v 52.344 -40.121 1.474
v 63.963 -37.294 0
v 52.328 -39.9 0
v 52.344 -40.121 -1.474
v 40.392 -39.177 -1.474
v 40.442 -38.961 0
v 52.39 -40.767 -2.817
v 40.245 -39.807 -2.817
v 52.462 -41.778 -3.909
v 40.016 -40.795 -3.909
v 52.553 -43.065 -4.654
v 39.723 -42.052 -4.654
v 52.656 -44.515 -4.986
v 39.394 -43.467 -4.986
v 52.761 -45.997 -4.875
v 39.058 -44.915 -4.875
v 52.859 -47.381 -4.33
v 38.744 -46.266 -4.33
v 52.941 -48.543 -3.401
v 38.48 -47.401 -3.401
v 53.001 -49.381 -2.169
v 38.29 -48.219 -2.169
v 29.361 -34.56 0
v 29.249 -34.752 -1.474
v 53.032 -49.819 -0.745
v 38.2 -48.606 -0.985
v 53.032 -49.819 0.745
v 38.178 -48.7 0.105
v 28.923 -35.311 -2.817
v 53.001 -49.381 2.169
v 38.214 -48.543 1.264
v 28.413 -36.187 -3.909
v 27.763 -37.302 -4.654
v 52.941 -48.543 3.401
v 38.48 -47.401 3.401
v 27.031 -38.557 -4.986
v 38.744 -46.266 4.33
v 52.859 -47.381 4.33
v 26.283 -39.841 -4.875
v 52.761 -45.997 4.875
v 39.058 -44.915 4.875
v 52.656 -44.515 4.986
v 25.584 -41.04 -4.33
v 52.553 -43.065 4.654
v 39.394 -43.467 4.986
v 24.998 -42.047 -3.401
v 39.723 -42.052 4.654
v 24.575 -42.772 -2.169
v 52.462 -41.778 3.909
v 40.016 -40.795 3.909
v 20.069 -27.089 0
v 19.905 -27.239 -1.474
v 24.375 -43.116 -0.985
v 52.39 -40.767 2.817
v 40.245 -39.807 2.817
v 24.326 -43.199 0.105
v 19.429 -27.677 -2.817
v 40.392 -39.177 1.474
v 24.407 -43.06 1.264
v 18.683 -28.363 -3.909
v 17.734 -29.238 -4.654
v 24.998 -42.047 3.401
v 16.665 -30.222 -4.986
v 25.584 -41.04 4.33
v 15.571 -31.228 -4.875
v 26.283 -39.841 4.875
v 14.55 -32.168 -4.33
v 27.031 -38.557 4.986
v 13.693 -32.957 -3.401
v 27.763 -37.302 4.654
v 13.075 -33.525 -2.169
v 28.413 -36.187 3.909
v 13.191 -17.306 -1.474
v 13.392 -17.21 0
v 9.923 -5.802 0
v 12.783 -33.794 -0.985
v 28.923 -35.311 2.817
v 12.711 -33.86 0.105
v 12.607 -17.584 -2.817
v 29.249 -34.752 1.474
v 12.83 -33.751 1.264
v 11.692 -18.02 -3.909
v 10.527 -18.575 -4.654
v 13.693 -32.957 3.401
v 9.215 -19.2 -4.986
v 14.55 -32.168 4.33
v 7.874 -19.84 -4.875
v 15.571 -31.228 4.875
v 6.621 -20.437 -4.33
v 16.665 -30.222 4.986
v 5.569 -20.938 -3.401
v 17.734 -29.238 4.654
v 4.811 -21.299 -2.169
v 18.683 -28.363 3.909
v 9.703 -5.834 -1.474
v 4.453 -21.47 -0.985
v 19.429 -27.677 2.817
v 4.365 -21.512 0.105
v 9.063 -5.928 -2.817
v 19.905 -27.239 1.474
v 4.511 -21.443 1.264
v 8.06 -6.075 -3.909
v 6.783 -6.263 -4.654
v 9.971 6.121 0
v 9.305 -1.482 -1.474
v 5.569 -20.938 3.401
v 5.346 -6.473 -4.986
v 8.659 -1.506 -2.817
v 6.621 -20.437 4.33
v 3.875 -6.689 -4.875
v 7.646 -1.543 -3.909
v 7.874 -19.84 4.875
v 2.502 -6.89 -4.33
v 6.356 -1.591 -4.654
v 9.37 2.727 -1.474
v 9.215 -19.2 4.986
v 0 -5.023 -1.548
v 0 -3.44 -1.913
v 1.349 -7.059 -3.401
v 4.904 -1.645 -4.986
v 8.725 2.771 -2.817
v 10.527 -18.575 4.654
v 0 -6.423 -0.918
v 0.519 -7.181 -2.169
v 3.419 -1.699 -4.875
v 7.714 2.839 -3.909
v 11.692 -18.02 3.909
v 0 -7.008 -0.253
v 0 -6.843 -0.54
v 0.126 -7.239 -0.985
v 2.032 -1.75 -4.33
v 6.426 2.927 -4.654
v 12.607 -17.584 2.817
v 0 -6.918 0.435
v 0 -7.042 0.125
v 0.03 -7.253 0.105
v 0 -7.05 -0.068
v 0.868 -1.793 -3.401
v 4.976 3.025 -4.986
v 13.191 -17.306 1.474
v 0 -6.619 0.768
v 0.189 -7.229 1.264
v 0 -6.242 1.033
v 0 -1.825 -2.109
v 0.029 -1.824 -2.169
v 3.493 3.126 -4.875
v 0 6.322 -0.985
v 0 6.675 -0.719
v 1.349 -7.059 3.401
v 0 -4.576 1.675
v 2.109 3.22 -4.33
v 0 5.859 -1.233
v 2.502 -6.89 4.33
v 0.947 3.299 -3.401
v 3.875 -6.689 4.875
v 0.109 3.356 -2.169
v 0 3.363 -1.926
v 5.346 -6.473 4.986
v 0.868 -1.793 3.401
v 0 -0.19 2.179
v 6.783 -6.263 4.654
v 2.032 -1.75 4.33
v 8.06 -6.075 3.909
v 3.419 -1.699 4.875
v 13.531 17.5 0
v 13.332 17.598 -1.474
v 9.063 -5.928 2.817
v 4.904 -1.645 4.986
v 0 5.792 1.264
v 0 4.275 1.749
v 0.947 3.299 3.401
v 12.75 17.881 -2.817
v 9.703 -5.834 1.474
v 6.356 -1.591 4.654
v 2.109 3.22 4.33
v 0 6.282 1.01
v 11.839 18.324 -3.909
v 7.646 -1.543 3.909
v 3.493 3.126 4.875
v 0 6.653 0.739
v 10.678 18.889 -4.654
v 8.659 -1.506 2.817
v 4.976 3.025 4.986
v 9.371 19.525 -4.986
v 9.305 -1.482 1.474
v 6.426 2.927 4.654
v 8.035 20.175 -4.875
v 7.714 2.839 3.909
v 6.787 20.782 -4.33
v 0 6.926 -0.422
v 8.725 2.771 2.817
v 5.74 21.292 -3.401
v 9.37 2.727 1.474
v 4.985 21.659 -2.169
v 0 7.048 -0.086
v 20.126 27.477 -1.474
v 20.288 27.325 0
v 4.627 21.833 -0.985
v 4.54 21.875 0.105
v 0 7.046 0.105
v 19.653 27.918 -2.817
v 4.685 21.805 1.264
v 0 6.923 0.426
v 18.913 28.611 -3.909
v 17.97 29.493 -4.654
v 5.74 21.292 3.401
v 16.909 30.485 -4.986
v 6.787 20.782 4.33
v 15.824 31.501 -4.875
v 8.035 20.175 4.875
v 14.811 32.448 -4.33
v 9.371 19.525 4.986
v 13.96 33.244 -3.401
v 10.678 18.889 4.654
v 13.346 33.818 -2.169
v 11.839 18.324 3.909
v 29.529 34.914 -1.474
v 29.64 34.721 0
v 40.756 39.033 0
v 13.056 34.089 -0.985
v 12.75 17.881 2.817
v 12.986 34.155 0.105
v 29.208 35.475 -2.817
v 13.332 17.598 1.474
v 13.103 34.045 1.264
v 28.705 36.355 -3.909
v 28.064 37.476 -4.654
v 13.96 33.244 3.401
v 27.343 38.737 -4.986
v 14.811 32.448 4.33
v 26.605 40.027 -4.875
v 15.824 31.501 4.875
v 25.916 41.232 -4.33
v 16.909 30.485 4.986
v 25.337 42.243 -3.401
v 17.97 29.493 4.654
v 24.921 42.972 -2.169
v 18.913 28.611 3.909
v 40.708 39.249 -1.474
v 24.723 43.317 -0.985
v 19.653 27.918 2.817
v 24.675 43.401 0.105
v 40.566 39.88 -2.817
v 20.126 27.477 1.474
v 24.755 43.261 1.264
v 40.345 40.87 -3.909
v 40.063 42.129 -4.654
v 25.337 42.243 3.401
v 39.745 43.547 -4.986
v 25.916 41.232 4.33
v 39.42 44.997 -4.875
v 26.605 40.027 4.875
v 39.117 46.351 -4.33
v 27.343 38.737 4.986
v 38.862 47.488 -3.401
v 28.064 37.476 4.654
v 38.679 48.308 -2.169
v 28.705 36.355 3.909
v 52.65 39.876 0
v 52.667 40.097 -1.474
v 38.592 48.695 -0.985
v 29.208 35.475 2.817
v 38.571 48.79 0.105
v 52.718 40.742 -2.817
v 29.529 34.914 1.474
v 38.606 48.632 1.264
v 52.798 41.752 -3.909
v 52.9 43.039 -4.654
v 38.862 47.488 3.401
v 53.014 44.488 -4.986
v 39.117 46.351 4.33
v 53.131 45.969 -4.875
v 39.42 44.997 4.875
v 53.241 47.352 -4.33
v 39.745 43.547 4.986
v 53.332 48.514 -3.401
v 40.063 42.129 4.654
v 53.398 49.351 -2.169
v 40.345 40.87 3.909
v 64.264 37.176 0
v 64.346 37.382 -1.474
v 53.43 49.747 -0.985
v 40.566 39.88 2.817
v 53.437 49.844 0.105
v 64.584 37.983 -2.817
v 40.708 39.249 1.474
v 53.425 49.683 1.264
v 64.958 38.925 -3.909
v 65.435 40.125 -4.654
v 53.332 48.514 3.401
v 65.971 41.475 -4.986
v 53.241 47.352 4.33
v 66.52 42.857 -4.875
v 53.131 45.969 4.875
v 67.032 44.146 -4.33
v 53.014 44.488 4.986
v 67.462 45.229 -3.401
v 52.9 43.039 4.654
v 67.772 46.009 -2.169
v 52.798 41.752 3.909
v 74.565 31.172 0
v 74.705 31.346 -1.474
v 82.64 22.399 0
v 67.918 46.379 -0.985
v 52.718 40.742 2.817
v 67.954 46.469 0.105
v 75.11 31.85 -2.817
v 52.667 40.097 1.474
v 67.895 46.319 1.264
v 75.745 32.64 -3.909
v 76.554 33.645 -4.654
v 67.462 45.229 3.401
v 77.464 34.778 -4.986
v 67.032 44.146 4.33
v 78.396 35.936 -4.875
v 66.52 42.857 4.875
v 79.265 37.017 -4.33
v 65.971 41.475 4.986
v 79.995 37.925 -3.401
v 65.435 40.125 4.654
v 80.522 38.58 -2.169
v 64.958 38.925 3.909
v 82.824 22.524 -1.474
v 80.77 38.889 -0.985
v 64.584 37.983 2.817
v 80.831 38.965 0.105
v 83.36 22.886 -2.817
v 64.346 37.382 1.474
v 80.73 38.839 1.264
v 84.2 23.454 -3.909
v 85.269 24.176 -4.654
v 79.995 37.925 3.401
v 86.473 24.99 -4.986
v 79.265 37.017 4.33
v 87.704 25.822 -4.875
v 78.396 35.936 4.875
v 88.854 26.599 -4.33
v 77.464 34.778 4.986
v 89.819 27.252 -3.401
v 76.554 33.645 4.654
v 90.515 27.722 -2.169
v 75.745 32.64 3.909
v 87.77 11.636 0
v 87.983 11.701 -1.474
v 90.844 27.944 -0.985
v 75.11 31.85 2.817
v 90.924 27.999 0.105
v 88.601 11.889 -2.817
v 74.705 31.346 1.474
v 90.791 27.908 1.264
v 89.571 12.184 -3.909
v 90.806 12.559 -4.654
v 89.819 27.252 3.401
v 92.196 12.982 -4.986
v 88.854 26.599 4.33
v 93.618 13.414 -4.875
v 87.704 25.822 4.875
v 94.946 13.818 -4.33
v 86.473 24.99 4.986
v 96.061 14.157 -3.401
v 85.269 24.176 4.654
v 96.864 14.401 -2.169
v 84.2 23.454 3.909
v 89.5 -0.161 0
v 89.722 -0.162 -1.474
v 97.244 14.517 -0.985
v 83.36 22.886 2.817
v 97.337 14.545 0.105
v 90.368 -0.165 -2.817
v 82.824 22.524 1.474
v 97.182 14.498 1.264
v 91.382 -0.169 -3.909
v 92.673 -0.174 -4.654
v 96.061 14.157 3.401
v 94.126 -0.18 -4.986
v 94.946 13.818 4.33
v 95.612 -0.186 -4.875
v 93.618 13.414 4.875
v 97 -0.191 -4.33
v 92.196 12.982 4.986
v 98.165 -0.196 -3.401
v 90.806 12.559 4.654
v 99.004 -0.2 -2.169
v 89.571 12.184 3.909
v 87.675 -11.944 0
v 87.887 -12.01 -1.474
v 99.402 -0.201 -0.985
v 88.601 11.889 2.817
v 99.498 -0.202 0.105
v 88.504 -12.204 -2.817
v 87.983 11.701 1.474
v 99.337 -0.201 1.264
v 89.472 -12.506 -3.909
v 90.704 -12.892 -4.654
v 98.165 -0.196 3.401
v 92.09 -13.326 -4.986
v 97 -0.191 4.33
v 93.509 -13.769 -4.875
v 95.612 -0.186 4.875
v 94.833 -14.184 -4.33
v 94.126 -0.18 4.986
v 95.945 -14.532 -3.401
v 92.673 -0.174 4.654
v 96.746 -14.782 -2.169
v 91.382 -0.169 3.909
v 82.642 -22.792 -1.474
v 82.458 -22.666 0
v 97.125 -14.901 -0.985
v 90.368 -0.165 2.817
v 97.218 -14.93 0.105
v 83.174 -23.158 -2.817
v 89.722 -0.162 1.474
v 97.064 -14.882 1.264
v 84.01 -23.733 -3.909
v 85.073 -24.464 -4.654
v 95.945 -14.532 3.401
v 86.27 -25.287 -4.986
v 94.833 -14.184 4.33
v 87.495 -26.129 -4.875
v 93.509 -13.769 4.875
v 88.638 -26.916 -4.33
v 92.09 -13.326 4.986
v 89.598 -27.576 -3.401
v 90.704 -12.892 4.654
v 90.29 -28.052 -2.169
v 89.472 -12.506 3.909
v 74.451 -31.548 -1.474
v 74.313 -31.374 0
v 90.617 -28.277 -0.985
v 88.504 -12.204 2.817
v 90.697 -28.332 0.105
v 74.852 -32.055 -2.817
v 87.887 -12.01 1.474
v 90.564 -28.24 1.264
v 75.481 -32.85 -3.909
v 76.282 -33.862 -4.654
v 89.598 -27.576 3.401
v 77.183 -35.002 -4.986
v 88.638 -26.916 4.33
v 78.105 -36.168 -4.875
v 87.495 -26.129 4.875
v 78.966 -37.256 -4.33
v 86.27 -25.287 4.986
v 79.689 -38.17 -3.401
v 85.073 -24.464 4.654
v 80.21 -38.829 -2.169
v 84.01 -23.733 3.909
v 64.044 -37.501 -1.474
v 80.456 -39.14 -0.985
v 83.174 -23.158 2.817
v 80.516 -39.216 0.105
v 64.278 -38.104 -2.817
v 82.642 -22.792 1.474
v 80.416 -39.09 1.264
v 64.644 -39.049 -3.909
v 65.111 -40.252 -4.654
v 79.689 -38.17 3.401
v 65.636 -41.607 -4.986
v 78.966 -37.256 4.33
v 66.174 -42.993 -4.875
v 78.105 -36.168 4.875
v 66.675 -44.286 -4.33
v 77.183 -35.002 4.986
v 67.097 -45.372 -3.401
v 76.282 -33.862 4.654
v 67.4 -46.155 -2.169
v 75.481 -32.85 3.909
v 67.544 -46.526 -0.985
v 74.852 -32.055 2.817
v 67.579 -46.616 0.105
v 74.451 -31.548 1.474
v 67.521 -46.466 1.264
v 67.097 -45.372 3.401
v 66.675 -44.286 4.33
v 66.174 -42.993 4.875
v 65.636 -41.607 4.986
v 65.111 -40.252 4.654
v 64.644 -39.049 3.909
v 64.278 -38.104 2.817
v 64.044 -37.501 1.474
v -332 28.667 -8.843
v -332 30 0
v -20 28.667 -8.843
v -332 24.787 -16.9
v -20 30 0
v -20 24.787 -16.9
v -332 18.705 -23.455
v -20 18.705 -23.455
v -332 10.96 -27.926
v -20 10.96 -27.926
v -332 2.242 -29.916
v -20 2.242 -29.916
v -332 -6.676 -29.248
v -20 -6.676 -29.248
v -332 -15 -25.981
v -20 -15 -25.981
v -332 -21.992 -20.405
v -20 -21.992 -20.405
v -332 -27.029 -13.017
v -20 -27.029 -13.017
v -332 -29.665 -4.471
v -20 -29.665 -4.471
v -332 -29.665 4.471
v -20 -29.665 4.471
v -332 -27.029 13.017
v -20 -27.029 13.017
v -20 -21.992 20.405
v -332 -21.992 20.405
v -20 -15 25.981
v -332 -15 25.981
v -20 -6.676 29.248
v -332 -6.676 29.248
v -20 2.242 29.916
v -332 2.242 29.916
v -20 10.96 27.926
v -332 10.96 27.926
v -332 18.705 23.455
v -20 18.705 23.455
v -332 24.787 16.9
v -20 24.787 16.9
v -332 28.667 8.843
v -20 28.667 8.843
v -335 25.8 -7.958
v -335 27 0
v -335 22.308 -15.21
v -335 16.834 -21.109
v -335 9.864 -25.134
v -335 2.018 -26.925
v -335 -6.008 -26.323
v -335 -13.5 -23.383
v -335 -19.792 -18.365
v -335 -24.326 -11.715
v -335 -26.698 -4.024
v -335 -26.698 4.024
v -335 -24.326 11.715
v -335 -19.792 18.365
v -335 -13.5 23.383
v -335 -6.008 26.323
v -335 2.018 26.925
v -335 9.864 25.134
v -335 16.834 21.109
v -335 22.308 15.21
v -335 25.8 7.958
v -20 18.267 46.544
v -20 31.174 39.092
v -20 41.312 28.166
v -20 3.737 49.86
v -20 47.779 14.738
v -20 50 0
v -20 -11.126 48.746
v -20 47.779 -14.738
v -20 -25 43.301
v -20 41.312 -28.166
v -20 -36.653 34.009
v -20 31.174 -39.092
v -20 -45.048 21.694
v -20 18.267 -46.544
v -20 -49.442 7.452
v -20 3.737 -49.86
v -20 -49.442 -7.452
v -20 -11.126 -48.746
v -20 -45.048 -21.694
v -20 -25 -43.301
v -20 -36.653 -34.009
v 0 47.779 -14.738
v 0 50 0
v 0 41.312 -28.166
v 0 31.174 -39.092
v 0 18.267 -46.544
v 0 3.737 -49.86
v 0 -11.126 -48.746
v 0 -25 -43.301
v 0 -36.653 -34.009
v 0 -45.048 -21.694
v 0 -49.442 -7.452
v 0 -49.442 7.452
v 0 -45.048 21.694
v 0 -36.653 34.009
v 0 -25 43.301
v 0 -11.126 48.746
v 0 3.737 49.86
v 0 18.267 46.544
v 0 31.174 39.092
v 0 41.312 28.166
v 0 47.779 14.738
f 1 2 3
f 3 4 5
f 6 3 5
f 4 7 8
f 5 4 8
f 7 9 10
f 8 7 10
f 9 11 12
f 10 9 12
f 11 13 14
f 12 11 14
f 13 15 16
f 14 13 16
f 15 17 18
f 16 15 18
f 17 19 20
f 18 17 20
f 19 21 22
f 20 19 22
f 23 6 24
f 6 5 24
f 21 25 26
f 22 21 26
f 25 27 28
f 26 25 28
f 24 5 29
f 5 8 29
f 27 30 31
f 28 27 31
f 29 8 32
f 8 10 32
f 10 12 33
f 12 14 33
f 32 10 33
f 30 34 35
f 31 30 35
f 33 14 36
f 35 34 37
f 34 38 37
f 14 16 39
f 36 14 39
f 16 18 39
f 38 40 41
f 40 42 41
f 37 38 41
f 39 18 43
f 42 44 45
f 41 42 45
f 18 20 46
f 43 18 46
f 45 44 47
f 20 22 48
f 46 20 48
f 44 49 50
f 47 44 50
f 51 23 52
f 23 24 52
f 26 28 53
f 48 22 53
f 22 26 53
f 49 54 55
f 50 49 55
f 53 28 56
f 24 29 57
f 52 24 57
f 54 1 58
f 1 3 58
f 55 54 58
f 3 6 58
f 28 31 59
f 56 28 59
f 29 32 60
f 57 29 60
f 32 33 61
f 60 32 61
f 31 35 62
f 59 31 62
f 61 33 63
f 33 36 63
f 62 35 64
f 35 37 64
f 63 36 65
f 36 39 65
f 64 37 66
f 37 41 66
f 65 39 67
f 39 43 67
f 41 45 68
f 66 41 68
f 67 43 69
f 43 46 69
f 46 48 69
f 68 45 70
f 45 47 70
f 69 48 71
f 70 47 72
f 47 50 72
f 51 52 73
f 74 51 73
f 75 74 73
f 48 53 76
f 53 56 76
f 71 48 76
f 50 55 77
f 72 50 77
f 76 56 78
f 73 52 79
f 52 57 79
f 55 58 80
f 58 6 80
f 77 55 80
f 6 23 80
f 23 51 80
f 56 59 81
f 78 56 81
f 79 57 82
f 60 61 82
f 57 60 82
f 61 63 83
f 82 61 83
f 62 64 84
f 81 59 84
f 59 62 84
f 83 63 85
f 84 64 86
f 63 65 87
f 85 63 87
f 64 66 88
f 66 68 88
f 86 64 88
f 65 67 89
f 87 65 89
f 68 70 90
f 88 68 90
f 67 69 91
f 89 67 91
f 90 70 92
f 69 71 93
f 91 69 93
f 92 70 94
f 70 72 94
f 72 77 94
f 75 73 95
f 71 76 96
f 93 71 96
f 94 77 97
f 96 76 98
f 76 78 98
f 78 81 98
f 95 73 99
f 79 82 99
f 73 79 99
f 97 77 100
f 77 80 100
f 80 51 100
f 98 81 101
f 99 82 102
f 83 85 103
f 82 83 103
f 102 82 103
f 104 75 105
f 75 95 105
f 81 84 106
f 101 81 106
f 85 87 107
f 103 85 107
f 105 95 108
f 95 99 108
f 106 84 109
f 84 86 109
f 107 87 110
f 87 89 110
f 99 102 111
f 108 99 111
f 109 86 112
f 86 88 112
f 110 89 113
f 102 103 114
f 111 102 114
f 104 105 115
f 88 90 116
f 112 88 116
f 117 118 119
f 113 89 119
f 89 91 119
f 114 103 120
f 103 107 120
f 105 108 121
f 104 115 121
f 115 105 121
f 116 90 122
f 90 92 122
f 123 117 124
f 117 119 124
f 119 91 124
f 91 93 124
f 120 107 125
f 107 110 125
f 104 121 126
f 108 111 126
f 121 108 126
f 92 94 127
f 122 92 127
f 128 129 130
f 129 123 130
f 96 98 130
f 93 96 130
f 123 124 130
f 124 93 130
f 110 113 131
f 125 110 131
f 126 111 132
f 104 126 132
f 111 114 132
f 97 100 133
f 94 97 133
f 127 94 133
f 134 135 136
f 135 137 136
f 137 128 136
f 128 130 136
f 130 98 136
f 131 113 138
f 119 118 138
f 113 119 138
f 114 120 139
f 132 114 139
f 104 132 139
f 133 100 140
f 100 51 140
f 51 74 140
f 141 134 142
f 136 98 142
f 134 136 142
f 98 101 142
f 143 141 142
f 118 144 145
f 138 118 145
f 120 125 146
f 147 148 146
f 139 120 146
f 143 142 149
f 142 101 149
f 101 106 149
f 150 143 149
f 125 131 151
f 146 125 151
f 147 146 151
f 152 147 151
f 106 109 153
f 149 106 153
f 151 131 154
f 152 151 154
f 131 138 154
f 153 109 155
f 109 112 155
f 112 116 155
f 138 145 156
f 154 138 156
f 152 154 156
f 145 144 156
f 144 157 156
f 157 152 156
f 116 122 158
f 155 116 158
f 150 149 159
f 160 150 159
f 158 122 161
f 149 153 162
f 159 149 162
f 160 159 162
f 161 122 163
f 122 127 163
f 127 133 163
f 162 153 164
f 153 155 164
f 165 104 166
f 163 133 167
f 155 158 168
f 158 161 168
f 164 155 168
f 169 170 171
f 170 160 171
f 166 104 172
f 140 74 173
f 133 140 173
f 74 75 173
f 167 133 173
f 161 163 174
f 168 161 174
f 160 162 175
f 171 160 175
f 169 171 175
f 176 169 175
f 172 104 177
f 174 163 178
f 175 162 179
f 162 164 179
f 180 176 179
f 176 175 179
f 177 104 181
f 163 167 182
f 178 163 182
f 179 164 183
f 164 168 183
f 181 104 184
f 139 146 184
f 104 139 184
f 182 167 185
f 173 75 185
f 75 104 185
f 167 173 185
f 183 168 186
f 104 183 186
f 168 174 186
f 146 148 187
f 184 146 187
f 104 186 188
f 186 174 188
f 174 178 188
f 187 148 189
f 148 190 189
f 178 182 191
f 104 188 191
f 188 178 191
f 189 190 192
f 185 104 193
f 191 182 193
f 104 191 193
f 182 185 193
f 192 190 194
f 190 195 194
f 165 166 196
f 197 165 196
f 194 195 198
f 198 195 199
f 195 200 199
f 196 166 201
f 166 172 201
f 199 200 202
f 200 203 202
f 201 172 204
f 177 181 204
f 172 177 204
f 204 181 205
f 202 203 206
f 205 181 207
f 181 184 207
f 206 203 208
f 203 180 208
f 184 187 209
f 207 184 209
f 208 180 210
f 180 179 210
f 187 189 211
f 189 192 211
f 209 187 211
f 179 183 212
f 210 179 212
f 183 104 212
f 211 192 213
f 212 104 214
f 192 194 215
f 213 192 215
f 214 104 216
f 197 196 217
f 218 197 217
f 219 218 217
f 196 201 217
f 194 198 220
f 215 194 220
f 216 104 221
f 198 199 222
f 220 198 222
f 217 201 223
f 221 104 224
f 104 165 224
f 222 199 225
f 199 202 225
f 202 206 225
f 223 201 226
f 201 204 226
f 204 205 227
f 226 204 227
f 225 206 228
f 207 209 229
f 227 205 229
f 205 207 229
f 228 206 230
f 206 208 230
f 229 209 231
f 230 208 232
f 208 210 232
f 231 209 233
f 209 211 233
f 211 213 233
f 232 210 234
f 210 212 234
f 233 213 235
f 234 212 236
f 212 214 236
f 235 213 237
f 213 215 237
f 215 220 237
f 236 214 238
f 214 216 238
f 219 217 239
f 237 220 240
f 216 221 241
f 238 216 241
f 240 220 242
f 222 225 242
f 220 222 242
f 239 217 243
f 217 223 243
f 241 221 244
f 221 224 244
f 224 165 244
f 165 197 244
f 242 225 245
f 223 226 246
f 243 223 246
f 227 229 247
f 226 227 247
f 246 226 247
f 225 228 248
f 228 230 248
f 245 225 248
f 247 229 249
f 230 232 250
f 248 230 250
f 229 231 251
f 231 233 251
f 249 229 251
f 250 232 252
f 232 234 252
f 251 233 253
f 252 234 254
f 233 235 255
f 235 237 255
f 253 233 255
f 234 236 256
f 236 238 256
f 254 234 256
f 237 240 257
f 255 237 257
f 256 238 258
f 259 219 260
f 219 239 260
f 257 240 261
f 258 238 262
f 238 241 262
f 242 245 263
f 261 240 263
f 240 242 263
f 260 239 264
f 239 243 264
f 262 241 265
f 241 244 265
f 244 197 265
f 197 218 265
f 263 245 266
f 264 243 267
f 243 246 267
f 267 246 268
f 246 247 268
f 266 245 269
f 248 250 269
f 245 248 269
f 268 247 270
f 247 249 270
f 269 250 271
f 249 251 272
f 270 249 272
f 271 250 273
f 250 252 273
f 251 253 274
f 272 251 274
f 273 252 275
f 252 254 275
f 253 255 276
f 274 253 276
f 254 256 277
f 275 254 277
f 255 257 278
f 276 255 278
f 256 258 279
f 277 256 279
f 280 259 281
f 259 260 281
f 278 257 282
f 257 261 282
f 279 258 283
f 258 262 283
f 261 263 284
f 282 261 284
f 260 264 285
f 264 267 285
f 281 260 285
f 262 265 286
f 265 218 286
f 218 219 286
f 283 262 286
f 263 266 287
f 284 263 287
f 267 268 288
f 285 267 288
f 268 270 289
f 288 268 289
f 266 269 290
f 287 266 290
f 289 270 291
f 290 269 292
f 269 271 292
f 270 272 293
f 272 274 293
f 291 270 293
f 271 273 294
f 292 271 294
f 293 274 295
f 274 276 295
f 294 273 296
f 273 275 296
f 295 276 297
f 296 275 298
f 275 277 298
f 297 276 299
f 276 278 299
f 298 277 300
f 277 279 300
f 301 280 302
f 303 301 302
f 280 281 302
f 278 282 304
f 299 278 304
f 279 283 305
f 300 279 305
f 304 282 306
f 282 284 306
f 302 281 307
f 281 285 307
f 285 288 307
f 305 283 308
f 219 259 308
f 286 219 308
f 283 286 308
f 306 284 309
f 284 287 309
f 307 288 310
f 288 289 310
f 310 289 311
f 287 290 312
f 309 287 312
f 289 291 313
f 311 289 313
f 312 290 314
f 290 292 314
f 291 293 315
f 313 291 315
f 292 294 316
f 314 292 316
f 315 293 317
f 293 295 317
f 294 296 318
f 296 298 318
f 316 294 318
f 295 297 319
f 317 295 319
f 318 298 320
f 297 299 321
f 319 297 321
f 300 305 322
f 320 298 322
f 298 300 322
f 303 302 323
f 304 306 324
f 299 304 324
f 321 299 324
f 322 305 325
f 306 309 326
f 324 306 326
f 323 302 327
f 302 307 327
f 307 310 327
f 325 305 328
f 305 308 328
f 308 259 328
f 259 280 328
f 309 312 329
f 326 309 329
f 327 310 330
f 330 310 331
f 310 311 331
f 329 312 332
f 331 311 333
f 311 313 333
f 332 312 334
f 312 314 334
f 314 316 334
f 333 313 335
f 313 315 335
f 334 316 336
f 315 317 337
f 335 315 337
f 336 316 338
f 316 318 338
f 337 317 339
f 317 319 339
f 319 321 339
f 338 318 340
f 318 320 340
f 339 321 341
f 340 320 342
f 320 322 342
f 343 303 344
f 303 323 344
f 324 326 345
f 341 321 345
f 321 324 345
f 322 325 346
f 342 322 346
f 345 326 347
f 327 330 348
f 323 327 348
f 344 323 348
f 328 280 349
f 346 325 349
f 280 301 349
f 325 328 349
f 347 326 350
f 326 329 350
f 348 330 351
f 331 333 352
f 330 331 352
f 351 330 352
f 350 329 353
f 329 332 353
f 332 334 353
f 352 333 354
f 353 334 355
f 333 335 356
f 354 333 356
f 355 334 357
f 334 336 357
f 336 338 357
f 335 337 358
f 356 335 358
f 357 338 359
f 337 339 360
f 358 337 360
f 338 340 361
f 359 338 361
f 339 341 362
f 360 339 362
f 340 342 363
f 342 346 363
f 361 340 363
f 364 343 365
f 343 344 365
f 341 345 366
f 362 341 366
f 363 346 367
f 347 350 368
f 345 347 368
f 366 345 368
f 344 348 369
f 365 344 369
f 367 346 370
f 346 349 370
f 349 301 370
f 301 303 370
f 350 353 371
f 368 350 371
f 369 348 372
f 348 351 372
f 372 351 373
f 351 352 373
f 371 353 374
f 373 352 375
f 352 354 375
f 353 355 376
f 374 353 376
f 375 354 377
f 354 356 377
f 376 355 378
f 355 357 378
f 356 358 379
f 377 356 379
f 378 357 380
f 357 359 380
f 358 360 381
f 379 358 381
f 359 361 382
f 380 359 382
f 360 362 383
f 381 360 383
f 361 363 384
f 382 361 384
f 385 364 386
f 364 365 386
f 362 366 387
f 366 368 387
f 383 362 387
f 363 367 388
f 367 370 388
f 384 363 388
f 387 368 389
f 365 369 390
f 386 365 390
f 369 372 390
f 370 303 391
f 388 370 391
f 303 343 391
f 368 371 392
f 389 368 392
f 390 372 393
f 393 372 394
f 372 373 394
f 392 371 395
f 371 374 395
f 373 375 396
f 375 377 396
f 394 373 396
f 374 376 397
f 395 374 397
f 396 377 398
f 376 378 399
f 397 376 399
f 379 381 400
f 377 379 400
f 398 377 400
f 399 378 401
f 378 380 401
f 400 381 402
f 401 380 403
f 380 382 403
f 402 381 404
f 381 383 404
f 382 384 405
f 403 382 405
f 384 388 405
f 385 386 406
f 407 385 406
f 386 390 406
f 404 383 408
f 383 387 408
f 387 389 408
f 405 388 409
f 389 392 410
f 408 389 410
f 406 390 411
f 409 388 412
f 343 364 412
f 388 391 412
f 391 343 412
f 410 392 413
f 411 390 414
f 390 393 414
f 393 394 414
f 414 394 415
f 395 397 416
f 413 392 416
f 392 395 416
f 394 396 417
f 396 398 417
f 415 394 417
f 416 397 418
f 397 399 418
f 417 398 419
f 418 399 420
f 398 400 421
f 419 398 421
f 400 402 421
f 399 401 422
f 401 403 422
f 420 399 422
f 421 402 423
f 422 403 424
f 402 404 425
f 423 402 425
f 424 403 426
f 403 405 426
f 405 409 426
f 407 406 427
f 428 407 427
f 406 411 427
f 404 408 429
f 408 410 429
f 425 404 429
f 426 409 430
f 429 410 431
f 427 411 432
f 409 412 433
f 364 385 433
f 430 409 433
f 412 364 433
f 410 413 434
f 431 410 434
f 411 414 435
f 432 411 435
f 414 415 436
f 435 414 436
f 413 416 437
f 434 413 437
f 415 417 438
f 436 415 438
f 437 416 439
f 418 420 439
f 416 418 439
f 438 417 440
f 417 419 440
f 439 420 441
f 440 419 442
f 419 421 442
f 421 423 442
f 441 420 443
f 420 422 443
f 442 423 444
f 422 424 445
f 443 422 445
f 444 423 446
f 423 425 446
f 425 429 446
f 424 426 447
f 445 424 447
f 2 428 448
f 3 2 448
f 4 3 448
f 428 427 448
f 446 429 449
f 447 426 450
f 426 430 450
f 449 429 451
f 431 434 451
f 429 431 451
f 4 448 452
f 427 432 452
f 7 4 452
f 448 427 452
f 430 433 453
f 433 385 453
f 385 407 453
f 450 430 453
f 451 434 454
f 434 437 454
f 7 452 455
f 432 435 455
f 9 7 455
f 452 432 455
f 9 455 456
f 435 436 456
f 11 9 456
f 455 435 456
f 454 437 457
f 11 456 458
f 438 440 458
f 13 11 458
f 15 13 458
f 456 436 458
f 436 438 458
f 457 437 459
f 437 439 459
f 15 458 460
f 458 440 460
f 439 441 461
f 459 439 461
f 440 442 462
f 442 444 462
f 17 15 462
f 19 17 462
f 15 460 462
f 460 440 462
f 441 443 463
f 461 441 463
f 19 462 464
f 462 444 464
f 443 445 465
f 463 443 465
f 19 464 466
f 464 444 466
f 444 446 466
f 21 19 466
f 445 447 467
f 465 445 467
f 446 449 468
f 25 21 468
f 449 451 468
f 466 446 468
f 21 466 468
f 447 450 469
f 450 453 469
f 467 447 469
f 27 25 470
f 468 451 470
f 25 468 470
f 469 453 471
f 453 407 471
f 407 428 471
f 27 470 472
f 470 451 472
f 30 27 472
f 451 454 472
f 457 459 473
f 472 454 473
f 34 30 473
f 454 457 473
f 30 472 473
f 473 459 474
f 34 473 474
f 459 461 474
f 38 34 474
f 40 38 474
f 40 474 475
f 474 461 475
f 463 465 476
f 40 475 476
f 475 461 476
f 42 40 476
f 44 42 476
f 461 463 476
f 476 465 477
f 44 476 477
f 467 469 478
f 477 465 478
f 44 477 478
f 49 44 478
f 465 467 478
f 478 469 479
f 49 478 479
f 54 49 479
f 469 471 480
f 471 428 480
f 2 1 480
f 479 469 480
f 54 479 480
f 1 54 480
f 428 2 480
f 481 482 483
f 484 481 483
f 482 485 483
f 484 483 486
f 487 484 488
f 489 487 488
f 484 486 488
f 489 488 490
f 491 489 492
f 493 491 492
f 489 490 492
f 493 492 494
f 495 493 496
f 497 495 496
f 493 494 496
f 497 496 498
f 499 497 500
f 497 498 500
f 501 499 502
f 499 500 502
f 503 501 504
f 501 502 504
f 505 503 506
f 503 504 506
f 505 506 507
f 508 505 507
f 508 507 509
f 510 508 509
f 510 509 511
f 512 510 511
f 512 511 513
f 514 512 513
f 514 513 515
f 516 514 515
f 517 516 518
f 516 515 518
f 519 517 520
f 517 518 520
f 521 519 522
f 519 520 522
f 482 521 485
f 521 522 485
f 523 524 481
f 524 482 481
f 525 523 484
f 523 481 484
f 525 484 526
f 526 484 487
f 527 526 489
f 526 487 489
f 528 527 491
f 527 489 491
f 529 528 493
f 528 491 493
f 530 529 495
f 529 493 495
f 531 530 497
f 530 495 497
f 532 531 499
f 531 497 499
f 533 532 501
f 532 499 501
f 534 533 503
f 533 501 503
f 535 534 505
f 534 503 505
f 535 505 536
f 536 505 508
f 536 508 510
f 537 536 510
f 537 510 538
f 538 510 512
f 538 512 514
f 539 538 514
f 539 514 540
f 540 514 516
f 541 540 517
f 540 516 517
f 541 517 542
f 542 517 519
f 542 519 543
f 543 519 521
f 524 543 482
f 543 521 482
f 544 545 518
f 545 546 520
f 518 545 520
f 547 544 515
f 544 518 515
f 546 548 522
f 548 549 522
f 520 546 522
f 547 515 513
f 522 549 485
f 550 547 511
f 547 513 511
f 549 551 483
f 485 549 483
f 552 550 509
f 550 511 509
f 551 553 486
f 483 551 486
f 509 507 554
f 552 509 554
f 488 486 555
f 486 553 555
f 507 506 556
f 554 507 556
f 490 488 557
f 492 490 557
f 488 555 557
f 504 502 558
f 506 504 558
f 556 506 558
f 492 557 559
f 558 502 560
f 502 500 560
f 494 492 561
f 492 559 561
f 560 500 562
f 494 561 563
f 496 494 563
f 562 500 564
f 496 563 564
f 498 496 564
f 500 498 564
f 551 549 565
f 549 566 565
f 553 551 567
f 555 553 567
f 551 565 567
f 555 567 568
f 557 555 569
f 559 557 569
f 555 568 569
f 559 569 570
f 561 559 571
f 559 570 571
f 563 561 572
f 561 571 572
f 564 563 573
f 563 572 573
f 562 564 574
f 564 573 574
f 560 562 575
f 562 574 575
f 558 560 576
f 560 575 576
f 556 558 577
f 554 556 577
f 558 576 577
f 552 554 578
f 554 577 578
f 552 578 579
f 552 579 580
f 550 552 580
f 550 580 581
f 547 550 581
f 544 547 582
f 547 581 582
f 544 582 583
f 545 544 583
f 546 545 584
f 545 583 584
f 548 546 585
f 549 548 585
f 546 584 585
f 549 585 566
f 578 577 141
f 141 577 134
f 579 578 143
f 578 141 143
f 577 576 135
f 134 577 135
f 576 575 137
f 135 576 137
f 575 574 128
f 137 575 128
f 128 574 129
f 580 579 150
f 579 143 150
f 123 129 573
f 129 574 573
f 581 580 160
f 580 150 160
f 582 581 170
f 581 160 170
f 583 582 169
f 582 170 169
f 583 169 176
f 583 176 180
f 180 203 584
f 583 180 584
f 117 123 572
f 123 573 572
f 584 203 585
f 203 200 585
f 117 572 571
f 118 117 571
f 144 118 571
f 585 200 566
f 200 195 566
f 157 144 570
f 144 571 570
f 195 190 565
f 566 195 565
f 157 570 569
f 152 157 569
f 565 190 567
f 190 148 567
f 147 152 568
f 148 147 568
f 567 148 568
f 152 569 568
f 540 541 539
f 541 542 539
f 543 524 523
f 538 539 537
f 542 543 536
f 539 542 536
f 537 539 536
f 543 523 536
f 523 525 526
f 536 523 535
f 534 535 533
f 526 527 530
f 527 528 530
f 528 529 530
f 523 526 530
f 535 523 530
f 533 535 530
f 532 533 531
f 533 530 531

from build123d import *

# Parameters (mm, degrees)
SKETCH_2_R = 5


with BuildPart() as part:
    # 草图1 → 旋转1 (revolve)
    with BuildSketch(Plane.XY):
        Polygon((0, 0), (-335, 0), (-335, 27), (-332, 30), (-20, 30), (-20, 50), (0, 50), align=None)
    revolve(axis=Axis((0, 0, 0), (-1, 0, 0)))

    # 草图2 → 旋转2 (revolve)
    with BuildSketch(Plane(origin=(0, 0, 0), x_dir=(1, 0, 0), z_dir=(0, 1, 0)), mode=Mode.PRIVATE) as revolve_2_sk:
        with Locations((4.5, 0)):
            Circle(SKETCH_2_R)
    revolve(revolve_2_sk.sketch.rotate(Axis((49.5, 0, 1000), (0, 0, -1)), 265.94519807), axis=Axis((49.5, 0, 1000), (0, 0, -1)))


solid = part.part
